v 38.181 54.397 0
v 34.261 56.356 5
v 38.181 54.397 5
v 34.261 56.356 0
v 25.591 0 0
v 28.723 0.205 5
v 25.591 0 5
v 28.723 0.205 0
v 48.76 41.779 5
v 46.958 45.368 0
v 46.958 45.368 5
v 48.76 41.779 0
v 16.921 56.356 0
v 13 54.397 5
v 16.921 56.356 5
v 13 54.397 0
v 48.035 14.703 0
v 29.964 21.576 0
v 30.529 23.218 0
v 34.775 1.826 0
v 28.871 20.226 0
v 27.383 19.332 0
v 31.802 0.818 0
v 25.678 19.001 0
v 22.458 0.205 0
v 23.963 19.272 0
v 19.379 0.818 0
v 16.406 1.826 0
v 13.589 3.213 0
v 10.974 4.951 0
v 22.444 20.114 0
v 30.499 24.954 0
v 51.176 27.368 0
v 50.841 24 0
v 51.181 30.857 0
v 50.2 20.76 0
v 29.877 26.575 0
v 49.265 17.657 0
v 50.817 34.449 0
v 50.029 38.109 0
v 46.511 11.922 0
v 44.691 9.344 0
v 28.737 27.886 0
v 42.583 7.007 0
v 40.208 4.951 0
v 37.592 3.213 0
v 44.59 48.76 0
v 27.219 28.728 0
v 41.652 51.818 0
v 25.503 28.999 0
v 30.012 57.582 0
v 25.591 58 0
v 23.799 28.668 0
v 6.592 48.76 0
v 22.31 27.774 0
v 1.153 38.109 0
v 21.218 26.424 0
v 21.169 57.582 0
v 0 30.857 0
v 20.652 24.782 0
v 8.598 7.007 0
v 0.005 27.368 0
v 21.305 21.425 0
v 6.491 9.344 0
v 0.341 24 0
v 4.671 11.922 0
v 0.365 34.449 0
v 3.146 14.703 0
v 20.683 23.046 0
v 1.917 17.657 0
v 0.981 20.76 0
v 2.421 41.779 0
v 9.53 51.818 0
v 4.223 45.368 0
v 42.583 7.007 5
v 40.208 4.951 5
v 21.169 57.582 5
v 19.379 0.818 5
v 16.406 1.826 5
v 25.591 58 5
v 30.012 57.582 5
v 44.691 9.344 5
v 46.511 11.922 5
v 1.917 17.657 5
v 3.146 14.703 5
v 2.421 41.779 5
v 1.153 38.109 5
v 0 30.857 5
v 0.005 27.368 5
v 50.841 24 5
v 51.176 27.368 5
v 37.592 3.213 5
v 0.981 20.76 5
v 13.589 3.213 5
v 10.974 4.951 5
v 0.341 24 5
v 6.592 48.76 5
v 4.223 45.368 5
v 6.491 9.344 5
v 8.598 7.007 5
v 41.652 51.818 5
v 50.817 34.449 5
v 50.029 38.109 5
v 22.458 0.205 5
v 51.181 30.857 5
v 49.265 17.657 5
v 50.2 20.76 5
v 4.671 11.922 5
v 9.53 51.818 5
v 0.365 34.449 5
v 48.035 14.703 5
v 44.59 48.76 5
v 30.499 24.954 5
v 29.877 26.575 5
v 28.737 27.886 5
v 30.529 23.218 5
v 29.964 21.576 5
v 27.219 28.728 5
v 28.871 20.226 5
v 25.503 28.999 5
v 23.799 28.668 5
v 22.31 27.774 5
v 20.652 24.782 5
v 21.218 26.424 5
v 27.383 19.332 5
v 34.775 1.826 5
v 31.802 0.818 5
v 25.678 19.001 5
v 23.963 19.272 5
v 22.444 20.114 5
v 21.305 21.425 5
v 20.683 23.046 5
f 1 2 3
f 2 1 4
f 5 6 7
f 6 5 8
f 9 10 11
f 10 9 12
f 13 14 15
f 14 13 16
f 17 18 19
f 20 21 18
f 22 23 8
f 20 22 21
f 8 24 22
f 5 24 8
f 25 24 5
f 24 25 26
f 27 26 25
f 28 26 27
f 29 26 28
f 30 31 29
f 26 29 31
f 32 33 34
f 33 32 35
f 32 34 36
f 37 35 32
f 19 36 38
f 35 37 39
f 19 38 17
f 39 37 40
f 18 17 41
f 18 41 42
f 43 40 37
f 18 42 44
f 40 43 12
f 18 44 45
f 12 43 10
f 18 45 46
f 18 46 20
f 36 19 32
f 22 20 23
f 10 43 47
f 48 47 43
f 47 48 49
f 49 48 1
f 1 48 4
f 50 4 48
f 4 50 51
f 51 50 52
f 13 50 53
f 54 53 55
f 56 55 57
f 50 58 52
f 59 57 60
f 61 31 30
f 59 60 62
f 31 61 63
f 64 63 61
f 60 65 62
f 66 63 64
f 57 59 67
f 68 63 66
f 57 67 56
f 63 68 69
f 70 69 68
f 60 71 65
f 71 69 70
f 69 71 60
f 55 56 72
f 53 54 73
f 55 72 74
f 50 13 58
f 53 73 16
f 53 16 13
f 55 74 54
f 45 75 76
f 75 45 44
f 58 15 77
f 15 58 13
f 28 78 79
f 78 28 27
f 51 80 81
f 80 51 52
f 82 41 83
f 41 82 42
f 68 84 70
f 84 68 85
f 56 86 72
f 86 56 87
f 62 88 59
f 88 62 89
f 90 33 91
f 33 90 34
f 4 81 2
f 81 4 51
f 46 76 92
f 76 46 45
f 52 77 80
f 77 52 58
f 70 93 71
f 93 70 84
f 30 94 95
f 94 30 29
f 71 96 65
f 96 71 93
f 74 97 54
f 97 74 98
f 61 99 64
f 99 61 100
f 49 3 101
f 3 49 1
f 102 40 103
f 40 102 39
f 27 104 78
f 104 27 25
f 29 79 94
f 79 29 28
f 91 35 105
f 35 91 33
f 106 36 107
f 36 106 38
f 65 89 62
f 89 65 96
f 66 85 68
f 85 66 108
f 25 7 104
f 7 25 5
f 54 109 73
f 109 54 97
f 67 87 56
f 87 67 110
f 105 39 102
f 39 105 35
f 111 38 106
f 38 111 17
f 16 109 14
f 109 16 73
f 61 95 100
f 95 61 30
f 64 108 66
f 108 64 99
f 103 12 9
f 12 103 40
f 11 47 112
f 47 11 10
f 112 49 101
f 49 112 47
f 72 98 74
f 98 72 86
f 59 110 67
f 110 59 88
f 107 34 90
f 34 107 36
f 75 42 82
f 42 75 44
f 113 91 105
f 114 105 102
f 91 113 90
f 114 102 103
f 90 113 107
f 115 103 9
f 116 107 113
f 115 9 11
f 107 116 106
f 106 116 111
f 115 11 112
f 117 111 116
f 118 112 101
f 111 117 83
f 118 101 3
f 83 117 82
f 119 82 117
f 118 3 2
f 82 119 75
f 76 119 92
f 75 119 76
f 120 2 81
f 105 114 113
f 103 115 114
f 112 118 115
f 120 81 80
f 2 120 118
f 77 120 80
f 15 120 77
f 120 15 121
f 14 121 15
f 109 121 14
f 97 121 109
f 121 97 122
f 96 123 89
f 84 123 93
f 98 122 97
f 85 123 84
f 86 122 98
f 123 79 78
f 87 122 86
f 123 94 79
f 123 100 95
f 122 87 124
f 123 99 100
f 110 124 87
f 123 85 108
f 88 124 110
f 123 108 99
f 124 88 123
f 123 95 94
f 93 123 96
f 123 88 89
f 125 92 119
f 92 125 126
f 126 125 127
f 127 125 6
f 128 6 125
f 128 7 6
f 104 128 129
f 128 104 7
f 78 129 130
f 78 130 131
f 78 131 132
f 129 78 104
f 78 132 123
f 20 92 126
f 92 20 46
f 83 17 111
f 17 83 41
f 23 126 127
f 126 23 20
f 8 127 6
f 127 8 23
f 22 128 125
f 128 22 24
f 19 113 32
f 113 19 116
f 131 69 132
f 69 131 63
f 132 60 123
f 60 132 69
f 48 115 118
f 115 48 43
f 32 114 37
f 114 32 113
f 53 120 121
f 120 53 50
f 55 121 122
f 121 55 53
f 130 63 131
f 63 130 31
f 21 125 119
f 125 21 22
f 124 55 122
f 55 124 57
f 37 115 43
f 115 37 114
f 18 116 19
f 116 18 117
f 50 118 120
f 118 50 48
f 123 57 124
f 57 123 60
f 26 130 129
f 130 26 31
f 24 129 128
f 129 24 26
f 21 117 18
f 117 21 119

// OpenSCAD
$fn = 32;

// ----------------------------------------------------------------------
// Cam plate: single_lobe cam, base R24
// ----------------------------------------------------------------------

// --- parameters (mm) ---
base_r = 24;              // base circle radius
lobe_h = 10;              // cam lobe rise
bore_r = 5;               // shaft bore radius
plate_t = 5;              // plate thickness, Z (extrusion height)

profile = [[50.841, 24], [51.176, 27.368], [51.181, 30.857], [50.817, 34.449], [50.029, 38.109], [48.76, 41.779], [46.958, 45.368], [44.59, 48.76], [41.652, 51.818], [38.181, 54.397], [34.261, 56.356], [30.012, 57.582], [25.591, 58], [21.169, 57.582], [16.921, 56.356], [13, 54.397], [9.53, 51.818], [6.592, 48.76], [4.223, 45.368], [2.421, 41.779], [1.153, 38.109], [0.365, 34.449], [0, 30.857], [0.005, 27.368], [0.341, 24], [0.981, 20.76], [1.917, 17.657], [3.146, 14.703], [4.671, 11.922], [6.491, 9.344], [8.598, 7.007], [10.974, 4.951], [13.589, 3.213], [16.406, 1.826], [19.379, 0.818], [22.458, 0.205], [25.591, 0], [28.723, 0.205], [31.802, 0.818], [34.775, 1.826], [37.592, 3.213], [40.208, 4.951], [42.583, 7.007], [44.691, 9.344], [46.511, 11.922], [48.035, 14.703], [49.265, 17.657], [50.2, 20.76]];  // primary outline, 48 points, counter clockwise
void_1 = [[30.499, 24.954], [29.877, 26.575], [28.737, 27.886], [27.219, 28.728], [25.503, 28.999], [23.799, 28.668], [22.31, 27.774], [21.218, 26.424], [20.652, 24.782], [20.683, 23.046], [21.305, 21.425], [22.444, 20.114], [23.963, 19.272], [25.678, 19.001], [27.383, 19.332], [28.871, 20.226], [29.964, 21.576], [30.529, 23.218]];  // shaft bore, 18 points

// --- the one profile operation ---
difference() {
  linear_extrude(height = plate_t) polygon(points = profile);
  translate([0, 0, -1])
    linear_extrude(height = plate_t + 2) polygon(points = void_1);
}
